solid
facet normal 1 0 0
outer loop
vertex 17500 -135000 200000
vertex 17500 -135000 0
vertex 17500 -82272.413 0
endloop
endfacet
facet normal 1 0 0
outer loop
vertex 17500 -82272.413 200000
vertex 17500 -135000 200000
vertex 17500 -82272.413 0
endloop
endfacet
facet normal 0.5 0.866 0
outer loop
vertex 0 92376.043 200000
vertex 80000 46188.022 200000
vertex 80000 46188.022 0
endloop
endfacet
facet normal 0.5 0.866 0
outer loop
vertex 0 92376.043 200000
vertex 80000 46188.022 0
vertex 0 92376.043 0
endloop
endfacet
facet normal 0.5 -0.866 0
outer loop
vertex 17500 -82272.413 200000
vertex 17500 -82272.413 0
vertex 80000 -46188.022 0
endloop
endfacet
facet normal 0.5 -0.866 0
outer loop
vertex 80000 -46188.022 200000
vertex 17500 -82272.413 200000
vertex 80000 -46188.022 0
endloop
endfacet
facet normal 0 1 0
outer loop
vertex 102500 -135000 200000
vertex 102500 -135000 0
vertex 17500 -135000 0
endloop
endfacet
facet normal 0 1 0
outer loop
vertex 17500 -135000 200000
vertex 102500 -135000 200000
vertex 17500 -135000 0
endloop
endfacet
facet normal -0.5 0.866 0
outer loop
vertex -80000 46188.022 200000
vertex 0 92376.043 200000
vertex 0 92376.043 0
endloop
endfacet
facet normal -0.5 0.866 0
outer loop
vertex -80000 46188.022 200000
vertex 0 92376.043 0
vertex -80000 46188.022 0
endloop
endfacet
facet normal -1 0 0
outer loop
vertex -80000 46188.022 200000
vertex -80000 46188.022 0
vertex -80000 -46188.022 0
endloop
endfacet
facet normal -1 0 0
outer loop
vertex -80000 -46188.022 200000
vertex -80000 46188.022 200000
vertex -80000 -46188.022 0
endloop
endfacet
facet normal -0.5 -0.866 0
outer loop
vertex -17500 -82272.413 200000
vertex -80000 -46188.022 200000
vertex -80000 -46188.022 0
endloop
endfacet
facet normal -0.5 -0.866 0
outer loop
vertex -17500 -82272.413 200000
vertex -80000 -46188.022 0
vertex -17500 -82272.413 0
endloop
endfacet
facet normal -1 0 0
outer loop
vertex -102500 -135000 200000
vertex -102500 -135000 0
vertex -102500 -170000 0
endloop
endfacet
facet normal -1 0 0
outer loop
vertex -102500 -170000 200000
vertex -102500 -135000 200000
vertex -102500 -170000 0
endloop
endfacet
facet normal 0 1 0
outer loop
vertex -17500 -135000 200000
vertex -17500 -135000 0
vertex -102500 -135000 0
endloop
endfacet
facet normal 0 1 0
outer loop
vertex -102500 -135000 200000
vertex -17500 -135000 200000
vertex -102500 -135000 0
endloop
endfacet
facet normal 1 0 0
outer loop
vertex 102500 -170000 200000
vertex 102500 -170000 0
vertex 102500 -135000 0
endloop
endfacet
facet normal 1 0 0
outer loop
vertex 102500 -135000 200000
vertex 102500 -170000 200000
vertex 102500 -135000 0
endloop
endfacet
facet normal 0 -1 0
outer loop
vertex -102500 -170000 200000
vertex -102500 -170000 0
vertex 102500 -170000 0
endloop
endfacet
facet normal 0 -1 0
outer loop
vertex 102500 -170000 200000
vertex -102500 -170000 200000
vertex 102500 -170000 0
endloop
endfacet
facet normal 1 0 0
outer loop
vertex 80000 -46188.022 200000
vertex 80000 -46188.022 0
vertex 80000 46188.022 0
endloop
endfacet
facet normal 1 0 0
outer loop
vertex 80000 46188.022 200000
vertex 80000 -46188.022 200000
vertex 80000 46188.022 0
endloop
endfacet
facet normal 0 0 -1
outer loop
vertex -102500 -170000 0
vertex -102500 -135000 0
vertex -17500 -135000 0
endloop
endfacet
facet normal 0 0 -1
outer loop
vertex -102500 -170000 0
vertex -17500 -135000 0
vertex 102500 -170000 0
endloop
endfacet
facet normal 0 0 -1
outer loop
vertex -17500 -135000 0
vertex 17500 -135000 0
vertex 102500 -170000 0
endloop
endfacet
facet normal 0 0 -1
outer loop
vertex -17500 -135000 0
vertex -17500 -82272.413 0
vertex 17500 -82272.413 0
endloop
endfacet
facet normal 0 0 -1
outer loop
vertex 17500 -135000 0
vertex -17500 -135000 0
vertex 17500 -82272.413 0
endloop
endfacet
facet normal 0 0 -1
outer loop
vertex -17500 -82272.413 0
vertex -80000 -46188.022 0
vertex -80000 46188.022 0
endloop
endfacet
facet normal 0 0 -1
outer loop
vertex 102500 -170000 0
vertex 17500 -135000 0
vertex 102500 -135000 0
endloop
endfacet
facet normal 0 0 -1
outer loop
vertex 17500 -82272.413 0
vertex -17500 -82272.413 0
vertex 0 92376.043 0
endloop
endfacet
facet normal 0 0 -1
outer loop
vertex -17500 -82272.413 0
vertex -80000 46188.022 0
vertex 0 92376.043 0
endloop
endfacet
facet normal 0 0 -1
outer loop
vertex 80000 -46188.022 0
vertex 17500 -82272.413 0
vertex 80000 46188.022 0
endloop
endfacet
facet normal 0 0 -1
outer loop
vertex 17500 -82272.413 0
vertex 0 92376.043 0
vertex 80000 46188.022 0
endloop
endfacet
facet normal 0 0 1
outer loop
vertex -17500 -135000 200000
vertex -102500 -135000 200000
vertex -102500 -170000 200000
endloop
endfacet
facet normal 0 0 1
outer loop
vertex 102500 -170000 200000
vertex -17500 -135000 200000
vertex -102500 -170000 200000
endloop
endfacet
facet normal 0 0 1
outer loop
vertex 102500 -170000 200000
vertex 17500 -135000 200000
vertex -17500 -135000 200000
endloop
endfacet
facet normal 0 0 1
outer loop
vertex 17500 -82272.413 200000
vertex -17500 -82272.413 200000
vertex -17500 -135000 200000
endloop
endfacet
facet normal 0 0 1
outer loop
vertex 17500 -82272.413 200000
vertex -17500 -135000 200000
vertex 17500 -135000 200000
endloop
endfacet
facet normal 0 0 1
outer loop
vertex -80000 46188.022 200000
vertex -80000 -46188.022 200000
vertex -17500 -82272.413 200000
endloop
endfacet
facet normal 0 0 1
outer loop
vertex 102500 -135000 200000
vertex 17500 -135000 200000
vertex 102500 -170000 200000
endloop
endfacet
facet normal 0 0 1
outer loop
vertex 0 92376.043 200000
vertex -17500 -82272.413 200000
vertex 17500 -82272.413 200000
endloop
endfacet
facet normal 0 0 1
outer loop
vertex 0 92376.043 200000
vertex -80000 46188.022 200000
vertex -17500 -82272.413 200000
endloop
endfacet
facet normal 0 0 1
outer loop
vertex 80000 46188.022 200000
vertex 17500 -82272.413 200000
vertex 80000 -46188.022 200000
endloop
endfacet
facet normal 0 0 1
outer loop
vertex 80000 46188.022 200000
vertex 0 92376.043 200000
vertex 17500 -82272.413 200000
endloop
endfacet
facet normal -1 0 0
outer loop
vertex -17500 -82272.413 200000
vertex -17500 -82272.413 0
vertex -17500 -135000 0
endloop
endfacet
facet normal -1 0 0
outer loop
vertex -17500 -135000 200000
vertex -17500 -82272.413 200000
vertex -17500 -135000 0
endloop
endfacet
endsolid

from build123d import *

# Parameters (mm, degrees)
BOSS_EXTRUDE1_DEPTH = 200000


with BuildPart() as part:
    # Sketch1 → Boss-Extrude1 (new body)
    with BuildSketch(Plane.XY):
        Polygon((0, 92376.04307034), (-80000, 46188.02153517), (-80000, -46188.02153517), (-17500, -82272.413359522), (-17500, -135000), (-102500, -135000), (-102500, -170000), (102500, -170000), (102500, -135000), (17500, -135000), (17500, -82272.413359522), (80000, -46188.02153517), (80000, 46188.02153517), align=None)
    extrude(amount=BOSS_EXTRUDE1_DEPTH)


solid = part.part
